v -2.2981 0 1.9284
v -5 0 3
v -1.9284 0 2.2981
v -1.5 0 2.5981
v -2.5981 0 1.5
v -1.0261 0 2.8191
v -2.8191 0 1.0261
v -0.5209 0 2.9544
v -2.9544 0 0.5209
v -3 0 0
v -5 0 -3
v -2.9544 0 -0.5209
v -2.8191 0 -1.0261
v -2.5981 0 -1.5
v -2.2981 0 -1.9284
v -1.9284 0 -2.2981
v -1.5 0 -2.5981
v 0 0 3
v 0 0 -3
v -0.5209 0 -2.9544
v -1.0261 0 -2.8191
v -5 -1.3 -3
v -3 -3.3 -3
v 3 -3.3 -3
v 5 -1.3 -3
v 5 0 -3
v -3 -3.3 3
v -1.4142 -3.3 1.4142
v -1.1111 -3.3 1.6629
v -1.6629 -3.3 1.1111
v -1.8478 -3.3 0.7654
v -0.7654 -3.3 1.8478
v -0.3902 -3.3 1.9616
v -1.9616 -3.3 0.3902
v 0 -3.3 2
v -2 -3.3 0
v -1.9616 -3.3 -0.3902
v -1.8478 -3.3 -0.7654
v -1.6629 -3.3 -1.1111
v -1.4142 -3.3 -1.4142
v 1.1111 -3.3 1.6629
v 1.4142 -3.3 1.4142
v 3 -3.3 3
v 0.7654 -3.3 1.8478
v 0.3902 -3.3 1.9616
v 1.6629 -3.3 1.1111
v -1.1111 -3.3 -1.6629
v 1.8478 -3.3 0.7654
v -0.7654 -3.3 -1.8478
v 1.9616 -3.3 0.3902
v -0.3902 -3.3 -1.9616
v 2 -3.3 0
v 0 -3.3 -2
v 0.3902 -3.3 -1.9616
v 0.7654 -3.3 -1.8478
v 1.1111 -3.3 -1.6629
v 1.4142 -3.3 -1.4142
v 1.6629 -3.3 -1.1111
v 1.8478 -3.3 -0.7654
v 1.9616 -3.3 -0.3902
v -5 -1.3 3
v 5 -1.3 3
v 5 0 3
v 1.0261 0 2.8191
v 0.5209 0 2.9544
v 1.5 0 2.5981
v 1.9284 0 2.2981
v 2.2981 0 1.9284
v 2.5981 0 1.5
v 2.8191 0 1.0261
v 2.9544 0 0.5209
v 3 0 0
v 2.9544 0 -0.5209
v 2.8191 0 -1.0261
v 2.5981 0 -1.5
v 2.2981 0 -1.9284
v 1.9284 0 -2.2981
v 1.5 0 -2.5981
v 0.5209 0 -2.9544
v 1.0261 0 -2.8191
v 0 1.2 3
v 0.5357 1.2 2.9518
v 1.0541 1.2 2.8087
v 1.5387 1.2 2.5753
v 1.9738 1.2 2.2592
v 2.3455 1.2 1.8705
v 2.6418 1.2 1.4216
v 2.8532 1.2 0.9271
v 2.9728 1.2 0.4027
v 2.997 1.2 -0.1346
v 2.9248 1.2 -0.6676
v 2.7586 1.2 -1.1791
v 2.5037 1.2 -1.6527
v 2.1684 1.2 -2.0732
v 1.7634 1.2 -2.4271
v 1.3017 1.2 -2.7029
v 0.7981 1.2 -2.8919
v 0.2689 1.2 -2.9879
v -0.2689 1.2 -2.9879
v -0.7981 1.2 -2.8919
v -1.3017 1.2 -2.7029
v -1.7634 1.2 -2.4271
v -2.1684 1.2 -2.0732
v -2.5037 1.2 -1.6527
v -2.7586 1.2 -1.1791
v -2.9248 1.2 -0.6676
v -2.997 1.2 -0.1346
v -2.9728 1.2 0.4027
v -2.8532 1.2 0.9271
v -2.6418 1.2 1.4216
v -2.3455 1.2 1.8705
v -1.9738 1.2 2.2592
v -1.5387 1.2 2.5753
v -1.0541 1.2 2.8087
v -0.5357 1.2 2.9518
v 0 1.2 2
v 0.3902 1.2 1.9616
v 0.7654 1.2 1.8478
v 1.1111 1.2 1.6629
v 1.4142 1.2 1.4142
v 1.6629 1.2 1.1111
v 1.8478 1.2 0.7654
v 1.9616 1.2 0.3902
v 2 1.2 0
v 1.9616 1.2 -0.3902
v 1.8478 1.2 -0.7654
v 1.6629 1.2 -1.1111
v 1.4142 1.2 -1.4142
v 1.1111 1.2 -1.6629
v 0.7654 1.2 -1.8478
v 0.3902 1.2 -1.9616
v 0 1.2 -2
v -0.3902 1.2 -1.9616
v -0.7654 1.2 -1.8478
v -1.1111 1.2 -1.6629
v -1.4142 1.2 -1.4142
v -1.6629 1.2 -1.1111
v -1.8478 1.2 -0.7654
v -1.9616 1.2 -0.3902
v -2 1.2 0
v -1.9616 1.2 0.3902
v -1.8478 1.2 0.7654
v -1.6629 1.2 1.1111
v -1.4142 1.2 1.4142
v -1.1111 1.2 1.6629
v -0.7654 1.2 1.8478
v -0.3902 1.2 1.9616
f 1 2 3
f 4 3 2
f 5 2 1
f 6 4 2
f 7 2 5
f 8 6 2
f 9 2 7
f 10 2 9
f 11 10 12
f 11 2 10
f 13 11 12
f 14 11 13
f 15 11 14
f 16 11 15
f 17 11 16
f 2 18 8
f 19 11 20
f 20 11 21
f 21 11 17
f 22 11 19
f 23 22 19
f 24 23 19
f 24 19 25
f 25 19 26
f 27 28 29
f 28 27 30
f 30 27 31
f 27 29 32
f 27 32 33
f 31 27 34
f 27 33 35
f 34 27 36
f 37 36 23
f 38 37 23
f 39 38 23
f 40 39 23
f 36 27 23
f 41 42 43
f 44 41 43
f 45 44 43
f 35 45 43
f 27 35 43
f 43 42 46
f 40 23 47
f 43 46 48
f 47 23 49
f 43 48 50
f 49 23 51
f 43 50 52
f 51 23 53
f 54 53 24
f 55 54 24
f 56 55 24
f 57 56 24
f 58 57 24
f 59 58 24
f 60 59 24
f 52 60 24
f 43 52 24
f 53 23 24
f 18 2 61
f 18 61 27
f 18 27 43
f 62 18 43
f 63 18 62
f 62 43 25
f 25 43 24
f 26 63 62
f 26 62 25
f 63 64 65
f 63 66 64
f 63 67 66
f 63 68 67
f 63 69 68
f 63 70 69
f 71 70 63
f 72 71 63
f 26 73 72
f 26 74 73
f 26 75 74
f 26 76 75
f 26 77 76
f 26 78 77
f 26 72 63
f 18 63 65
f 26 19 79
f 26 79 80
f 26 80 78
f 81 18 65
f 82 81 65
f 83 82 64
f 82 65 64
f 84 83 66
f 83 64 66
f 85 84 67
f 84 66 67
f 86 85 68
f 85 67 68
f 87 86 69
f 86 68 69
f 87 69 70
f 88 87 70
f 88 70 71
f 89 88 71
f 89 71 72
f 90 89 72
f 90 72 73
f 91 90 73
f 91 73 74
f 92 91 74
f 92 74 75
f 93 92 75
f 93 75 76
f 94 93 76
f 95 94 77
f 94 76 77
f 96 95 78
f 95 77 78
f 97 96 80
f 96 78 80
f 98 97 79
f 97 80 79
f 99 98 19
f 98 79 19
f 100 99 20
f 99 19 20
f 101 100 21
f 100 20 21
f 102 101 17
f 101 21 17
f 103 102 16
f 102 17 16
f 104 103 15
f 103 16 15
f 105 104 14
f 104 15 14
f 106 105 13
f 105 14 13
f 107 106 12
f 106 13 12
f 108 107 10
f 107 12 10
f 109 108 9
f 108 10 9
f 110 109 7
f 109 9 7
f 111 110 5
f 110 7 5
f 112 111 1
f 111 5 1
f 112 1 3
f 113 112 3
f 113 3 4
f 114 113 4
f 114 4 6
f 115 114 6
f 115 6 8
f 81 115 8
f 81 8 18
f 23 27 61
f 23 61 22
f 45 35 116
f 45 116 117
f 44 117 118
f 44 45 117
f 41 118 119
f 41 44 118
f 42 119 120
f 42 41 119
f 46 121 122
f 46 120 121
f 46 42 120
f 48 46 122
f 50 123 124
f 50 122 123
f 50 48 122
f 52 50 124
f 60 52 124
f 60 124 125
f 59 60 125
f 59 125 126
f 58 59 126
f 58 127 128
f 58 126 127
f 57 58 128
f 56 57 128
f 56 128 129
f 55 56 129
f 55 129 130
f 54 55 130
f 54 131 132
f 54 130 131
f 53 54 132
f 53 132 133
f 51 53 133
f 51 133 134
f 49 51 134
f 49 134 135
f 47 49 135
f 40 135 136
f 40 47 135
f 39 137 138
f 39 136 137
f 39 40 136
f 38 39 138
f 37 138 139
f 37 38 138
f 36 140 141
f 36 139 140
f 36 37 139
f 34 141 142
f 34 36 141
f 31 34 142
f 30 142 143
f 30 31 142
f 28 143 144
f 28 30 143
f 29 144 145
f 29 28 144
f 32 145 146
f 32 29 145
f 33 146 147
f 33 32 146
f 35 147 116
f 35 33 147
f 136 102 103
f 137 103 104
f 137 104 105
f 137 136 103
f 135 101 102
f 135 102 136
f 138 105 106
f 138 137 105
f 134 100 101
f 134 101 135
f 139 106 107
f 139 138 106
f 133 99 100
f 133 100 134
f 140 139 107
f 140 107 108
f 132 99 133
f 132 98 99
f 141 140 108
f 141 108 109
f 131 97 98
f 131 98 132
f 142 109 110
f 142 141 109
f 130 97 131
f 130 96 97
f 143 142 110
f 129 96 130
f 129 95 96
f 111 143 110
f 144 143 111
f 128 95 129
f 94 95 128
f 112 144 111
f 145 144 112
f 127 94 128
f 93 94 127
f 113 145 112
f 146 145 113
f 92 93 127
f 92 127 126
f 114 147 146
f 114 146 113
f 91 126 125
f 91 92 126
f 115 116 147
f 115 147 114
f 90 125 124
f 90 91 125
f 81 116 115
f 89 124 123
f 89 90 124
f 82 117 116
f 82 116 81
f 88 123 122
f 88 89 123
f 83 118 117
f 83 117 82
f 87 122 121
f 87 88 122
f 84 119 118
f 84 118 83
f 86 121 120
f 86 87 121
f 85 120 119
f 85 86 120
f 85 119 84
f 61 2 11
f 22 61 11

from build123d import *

# Parameters (mm, degrees)
SKETCH1_W               = 10
SKETCH1_H               = 6
BOSS_EXTRUDE1_DEPTH     = 3.3
SKETCH2_R               = 3
BOSS_EXTRUDE2_DEPTH     = 1.2
CUT_EXTRUDE1_DEPTH      = 8.365459931
CUT_EXTRUDE1_DEPTH_BACK = 8.365459931
SKETCH3_R               = 2
CHAMFER1_SIZE           = 2


with BuildPart() as part:
    # Sketch1 → Boss-Extrude1 (new body)
    with BuildSketch(Plane(origin=(0, 0, 0), x_dir=(1, 0, 0), z_dir=(0, 1, 0))):
        Rectangle(SKETCH1_W, SKETCH1_H)
    extrude(amount=-BOSS_EXTRUDE1_DEPTH)

    # Sketch2 → Boss-Extrude2 (add)
    with BuildSketch(Plane(origin=(0, 0, 0), x_dir=(1, 0, 0), z_dir=(0, 1, 0))):
        with Locations(Location((0, 0, 0), (0, 0, 270))):
            Circle(SKETCH2_R)
    extrude(amount=BOSS_EXTRUDE2_DEPTH)

    # Sketch3 → Cut-Extrude1 (cut, two sides: drawn at the far end of the back side and taken through both)
    with BuildSketch(Plane(origin=(0, 1.2, 0), x_dir=(1, 0, 0), z_dir=(0, 1, 0)).offset(-CUT_EXTRUDE1_DEPTH_BACK)):
        with Locations(Location((0, 0, 0), (0, 0, 270))):
            Circle(SKETCH3_R)
    extrude(amount=CUT_EXTRUDE1_DEPTH + CUT_EXTRUDE1_DEPTH_BACK, mode=Mode.SUBTRACT)

    # Chamfer1
    chamfer1_edges = [part.edges().sort_by_distance(p)[0] for p in [
        (-5, -3.3, 0),
        (5, -3.3, 0),
    ]]
    chamfer(chamfer1_edges, length=CHAMFER1_SIZE)


solid = part.part
